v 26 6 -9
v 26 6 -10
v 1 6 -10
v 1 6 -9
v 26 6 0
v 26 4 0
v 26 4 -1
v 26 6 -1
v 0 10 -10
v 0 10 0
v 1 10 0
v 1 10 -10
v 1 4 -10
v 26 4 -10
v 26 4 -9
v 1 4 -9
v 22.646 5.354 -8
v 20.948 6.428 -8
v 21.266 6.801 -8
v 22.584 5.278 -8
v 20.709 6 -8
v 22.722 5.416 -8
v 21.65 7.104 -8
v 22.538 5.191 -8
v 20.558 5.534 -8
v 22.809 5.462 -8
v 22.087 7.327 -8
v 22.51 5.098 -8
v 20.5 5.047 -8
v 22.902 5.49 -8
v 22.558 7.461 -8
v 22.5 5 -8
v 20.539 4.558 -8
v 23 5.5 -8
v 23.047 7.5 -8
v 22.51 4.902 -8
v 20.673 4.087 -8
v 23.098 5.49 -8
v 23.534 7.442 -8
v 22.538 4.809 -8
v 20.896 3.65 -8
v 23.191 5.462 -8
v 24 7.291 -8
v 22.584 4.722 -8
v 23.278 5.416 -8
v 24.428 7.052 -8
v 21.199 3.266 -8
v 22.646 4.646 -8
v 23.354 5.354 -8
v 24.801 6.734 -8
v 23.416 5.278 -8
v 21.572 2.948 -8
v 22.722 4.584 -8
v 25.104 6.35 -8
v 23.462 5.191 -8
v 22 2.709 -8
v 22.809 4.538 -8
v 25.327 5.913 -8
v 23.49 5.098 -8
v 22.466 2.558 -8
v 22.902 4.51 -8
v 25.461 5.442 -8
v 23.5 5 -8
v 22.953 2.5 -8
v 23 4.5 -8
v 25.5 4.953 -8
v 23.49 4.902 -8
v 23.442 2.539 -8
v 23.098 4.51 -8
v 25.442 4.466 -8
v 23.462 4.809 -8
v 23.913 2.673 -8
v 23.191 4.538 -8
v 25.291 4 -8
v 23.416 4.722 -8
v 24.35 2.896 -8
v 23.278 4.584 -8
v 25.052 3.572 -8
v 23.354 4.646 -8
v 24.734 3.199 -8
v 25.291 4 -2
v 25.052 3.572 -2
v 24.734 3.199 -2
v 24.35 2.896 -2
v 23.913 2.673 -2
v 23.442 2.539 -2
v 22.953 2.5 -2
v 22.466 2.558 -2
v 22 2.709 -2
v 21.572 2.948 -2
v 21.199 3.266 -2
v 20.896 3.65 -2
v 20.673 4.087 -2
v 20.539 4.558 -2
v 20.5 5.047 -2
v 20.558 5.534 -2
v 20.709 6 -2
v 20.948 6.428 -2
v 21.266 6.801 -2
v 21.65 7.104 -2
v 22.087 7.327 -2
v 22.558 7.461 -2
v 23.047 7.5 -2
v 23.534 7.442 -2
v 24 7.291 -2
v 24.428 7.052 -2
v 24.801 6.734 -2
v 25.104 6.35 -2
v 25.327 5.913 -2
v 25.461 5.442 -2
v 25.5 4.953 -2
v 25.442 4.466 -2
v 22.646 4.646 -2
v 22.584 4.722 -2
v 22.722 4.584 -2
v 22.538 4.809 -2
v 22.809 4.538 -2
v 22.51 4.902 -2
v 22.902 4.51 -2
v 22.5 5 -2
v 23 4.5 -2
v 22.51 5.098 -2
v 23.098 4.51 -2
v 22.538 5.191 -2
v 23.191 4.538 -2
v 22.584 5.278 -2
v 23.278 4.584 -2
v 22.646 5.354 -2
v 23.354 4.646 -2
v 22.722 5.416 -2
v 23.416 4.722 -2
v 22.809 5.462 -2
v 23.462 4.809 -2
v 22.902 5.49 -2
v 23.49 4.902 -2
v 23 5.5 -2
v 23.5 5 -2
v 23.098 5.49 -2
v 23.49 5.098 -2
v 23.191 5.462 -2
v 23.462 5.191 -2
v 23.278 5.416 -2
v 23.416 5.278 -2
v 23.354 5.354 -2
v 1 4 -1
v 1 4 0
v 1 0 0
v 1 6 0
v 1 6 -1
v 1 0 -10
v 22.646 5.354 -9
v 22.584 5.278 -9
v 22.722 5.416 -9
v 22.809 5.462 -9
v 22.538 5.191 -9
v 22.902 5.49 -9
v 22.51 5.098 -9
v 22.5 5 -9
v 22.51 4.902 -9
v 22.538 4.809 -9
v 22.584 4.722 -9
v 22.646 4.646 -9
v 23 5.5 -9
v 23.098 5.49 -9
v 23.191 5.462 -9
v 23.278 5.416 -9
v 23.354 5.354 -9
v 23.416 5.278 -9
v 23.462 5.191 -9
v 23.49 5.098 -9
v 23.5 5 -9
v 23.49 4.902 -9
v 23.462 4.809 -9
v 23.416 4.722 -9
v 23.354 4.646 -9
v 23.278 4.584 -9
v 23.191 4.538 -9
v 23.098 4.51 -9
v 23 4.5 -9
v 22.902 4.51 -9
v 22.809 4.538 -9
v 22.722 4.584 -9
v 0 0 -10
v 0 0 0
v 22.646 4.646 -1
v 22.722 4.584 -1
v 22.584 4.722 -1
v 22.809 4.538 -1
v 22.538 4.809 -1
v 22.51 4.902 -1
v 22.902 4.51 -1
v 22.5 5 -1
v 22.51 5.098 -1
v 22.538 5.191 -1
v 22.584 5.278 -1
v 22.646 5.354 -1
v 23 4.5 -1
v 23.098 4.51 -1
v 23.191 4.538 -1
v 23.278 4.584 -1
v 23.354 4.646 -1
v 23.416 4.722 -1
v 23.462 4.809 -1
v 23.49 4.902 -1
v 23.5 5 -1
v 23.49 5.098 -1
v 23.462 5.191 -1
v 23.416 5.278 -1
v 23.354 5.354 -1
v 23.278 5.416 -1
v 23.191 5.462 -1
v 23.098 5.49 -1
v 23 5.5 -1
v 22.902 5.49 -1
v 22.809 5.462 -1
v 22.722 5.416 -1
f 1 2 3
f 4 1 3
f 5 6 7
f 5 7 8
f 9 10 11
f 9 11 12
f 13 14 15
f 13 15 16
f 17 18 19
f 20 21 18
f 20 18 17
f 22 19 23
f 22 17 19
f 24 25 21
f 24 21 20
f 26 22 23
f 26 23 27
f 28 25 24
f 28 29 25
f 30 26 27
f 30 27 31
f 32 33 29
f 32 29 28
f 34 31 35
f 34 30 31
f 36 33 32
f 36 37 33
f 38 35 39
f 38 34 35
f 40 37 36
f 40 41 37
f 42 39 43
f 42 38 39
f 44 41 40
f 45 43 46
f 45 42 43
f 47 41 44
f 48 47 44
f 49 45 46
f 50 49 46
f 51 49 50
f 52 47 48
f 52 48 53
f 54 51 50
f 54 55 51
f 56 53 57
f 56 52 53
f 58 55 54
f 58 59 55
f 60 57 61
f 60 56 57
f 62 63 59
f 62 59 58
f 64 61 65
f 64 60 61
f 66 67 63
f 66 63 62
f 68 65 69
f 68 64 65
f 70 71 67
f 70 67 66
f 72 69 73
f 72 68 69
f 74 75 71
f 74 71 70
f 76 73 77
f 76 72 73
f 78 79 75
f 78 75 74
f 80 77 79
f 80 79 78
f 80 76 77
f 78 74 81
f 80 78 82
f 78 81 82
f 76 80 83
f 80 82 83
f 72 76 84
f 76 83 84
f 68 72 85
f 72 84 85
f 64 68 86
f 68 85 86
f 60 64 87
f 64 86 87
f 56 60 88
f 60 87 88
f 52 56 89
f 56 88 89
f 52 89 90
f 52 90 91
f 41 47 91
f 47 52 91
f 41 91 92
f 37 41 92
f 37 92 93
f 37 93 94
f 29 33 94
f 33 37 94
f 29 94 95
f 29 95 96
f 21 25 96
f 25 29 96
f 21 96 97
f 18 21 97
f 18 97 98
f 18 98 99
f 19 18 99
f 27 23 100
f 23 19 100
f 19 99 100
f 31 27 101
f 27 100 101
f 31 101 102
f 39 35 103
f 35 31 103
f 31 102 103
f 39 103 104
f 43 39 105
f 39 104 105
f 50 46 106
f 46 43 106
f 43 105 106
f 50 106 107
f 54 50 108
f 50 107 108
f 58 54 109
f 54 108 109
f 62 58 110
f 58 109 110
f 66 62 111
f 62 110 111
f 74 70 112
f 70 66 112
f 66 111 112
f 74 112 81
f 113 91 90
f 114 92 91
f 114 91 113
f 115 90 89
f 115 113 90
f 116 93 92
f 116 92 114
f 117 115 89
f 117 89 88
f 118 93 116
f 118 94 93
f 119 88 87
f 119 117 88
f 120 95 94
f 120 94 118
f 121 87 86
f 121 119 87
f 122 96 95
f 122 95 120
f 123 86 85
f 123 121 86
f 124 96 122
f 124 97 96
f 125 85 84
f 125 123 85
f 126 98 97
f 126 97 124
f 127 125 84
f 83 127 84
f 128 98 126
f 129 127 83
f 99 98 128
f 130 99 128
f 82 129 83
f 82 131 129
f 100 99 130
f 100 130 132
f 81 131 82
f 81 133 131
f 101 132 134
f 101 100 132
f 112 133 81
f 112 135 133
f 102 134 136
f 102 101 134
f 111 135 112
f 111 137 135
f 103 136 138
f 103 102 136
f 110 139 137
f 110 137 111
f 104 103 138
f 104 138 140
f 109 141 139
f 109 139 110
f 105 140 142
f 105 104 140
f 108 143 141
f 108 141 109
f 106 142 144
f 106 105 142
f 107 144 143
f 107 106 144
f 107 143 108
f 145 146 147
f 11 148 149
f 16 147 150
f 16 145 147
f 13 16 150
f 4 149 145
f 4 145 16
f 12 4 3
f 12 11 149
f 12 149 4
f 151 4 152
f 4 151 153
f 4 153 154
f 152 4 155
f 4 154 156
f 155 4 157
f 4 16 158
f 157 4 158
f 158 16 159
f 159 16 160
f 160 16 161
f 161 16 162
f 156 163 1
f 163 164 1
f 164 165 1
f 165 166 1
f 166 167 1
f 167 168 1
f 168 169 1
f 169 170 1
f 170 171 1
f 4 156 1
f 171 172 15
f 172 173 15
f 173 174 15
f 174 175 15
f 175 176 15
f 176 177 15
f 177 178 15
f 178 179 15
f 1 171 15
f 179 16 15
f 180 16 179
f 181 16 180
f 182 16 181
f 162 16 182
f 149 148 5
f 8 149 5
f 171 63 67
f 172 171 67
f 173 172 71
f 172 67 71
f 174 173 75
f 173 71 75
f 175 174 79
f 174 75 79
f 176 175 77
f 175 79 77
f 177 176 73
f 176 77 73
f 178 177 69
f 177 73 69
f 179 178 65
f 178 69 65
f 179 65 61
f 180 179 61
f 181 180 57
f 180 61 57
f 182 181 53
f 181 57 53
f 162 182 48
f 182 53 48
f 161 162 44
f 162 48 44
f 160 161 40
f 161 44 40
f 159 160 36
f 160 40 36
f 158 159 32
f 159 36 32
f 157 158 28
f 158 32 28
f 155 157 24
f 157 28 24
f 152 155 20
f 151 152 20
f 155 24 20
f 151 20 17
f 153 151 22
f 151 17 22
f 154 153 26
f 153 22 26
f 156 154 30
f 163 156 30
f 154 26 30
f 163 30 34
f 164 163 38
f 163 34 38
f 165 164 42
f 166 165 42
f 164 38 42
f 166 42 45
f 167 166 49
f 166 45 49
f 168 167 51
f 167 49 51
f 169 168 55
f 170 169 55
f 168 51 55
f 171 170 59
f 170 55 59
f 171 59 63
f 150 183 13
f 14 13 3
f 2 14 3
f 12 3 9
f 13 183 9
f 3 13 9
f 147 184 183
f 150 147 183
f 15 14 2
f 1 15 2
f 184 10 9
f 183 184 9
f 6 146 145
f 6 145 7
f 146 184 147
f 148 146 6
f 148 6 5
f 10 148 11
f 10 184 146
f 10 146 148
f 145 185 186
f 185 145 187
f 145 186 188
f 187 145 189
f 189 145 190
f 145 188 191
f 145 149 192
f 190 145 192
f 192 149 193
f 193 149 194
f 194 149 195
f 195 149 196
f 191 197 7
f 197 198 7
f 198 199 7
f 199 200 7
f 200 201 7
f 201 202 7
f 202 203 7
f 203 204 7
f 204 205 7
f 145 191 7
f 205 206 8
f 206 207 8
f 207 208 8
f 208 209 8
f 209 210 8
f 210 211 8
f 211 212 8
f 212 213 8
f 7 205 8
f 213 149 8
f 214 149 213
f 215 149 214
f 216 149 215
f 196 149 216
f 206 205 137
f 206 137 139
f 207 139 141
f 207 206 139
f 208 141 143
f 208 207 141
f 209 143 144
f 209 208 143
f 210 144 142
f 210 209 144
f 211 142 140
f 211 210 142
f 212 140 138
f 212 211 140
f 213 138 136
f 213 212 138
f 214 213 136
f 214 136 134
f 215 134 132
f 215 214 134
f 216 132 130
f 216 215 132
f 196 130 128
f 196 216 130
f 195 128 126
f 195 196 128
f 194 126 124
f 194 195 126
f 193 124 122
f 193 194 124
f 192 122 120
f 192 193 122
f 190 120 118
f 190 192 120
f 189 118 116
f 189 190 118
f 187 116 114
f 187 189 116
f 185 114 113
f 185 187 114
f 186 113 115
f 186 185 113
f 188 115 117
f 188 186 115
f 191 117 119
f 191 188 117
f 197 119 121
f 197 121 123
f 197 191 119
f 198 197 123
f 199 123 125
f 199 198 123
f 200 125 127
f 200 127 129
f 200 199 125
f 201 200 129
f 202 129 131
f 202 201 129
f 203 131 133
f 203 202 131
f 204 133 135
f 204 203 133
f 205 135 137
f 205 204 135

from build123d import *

# Parameters (mm, degrees)
SKETCH_1_W          = 10
SKETCH_1_H          = 10
EXTRUDE_1_DEPTH     = 1
SKETCH_2_W          = 25
SKETCH_2_H          = 2
EXTRUDE_2_DEPTH     = 1
SKETCH_3_W          = 25
SKETCH_3_H          = 2
EXTRUDE_3_DEPTH     = 1
SKETCH_4_R          = 2.5
EXTRUDE_4_DEPTH     = 8
SKETCH_5_R          = 2.5
SKETCH_5_R_2        = 0.5
CUT_EXTRUDE_3_DEPTH = 1
CUT_EXTRUDE_START   = -1
SKETCH_6_R          = 2.5
SKETCH_6_R_2        = 0.5
CUT_EXTRUDE_4_DEPTH = 1


with BuildPart() as part:
    # 草图1 → 凸台-拉伸1 (new body)
    with BuildSketch(Plane(origin=(0, 0, 0), x_dir=(0, 0, -1), z_dir=(1, 0, 0))):
        with Locations((5, 5)):
            Rectangle(SKETCH_1_W, SKETCH_1_H)
    extrude(amount=EXTRUDE_1_DEPTH)

    # 草图2 → 凸台-拉伸2 (add)
    with BuildSketch(Plane.XY):
        with Locations((13.5, 5)):
            Rectangle(SKETCH_2_W, SKETCH_2_H)
    extrude(amount=-EXTRUDE_2_DEPTH)

    # 草图3 → 凸台-拉伸3 (add)
    with BuildSketch(Plane(origin=(0, 0, -10), x_dir=(-1, 0, 0), z_dir=(0, 0, -1))):
        with Locations((-13.5, 5)):
            Rectangle(SKETCH_3_W, SKETCH_3_H)
    extrude(amount=-EXTRUDE_3_DEPTH)

    # 草图4 → 凸台-拉伸4 (add)
    with BuildSketch(Plane(origin=(0, 0, -1), x_dir=(-1, 0, 0), z_dir=(0, 0, -1))):
        with Locations(Location((-23, 5, 0), (0, 0, 203.578178478))):
            Circle(SKETCH_4_R)
    extrude(amount=EXTRUDE_4_DEPTH)

    # 草图5 → 切除-拉伸3 (cut)
    with BuildSketch(Plane.XY.offset(-1)):
        with Locations((23, 5)):
            Circle(SKETCH_5_R)
        with Locations((23, 5)):
            Circle(SKETCH_5_R_2, mode=Mode.SUBTRACT)
    extrude(amount=-CUT_EXTRUDE_3_DEPTH, mode=Mode.SUBTRACT)

    # 草图6 → 切除-拉伸4 (cut)
    with BuildSketch(Plane(origin=(0, 0, -9), x_dir=(-1, 0, 0), z_dir=(0, 0, -1)).offset(CUT_EXTRUDE_START)):
        with Locations(Location((-23, 5, 0), (0, 0, 180))):
            Circle(SKETCH_6_R)
        with Locations(Location((-23, 5, 0), (0, 0, 180))):
            Circle(SKETCH_6_R_2, mode=Mode.SUBTRACT)
    extrude(amount=CUT_EXTRUDE_4_DEPTH, mode=Mode.SUBTRACT)


solid = part.part
